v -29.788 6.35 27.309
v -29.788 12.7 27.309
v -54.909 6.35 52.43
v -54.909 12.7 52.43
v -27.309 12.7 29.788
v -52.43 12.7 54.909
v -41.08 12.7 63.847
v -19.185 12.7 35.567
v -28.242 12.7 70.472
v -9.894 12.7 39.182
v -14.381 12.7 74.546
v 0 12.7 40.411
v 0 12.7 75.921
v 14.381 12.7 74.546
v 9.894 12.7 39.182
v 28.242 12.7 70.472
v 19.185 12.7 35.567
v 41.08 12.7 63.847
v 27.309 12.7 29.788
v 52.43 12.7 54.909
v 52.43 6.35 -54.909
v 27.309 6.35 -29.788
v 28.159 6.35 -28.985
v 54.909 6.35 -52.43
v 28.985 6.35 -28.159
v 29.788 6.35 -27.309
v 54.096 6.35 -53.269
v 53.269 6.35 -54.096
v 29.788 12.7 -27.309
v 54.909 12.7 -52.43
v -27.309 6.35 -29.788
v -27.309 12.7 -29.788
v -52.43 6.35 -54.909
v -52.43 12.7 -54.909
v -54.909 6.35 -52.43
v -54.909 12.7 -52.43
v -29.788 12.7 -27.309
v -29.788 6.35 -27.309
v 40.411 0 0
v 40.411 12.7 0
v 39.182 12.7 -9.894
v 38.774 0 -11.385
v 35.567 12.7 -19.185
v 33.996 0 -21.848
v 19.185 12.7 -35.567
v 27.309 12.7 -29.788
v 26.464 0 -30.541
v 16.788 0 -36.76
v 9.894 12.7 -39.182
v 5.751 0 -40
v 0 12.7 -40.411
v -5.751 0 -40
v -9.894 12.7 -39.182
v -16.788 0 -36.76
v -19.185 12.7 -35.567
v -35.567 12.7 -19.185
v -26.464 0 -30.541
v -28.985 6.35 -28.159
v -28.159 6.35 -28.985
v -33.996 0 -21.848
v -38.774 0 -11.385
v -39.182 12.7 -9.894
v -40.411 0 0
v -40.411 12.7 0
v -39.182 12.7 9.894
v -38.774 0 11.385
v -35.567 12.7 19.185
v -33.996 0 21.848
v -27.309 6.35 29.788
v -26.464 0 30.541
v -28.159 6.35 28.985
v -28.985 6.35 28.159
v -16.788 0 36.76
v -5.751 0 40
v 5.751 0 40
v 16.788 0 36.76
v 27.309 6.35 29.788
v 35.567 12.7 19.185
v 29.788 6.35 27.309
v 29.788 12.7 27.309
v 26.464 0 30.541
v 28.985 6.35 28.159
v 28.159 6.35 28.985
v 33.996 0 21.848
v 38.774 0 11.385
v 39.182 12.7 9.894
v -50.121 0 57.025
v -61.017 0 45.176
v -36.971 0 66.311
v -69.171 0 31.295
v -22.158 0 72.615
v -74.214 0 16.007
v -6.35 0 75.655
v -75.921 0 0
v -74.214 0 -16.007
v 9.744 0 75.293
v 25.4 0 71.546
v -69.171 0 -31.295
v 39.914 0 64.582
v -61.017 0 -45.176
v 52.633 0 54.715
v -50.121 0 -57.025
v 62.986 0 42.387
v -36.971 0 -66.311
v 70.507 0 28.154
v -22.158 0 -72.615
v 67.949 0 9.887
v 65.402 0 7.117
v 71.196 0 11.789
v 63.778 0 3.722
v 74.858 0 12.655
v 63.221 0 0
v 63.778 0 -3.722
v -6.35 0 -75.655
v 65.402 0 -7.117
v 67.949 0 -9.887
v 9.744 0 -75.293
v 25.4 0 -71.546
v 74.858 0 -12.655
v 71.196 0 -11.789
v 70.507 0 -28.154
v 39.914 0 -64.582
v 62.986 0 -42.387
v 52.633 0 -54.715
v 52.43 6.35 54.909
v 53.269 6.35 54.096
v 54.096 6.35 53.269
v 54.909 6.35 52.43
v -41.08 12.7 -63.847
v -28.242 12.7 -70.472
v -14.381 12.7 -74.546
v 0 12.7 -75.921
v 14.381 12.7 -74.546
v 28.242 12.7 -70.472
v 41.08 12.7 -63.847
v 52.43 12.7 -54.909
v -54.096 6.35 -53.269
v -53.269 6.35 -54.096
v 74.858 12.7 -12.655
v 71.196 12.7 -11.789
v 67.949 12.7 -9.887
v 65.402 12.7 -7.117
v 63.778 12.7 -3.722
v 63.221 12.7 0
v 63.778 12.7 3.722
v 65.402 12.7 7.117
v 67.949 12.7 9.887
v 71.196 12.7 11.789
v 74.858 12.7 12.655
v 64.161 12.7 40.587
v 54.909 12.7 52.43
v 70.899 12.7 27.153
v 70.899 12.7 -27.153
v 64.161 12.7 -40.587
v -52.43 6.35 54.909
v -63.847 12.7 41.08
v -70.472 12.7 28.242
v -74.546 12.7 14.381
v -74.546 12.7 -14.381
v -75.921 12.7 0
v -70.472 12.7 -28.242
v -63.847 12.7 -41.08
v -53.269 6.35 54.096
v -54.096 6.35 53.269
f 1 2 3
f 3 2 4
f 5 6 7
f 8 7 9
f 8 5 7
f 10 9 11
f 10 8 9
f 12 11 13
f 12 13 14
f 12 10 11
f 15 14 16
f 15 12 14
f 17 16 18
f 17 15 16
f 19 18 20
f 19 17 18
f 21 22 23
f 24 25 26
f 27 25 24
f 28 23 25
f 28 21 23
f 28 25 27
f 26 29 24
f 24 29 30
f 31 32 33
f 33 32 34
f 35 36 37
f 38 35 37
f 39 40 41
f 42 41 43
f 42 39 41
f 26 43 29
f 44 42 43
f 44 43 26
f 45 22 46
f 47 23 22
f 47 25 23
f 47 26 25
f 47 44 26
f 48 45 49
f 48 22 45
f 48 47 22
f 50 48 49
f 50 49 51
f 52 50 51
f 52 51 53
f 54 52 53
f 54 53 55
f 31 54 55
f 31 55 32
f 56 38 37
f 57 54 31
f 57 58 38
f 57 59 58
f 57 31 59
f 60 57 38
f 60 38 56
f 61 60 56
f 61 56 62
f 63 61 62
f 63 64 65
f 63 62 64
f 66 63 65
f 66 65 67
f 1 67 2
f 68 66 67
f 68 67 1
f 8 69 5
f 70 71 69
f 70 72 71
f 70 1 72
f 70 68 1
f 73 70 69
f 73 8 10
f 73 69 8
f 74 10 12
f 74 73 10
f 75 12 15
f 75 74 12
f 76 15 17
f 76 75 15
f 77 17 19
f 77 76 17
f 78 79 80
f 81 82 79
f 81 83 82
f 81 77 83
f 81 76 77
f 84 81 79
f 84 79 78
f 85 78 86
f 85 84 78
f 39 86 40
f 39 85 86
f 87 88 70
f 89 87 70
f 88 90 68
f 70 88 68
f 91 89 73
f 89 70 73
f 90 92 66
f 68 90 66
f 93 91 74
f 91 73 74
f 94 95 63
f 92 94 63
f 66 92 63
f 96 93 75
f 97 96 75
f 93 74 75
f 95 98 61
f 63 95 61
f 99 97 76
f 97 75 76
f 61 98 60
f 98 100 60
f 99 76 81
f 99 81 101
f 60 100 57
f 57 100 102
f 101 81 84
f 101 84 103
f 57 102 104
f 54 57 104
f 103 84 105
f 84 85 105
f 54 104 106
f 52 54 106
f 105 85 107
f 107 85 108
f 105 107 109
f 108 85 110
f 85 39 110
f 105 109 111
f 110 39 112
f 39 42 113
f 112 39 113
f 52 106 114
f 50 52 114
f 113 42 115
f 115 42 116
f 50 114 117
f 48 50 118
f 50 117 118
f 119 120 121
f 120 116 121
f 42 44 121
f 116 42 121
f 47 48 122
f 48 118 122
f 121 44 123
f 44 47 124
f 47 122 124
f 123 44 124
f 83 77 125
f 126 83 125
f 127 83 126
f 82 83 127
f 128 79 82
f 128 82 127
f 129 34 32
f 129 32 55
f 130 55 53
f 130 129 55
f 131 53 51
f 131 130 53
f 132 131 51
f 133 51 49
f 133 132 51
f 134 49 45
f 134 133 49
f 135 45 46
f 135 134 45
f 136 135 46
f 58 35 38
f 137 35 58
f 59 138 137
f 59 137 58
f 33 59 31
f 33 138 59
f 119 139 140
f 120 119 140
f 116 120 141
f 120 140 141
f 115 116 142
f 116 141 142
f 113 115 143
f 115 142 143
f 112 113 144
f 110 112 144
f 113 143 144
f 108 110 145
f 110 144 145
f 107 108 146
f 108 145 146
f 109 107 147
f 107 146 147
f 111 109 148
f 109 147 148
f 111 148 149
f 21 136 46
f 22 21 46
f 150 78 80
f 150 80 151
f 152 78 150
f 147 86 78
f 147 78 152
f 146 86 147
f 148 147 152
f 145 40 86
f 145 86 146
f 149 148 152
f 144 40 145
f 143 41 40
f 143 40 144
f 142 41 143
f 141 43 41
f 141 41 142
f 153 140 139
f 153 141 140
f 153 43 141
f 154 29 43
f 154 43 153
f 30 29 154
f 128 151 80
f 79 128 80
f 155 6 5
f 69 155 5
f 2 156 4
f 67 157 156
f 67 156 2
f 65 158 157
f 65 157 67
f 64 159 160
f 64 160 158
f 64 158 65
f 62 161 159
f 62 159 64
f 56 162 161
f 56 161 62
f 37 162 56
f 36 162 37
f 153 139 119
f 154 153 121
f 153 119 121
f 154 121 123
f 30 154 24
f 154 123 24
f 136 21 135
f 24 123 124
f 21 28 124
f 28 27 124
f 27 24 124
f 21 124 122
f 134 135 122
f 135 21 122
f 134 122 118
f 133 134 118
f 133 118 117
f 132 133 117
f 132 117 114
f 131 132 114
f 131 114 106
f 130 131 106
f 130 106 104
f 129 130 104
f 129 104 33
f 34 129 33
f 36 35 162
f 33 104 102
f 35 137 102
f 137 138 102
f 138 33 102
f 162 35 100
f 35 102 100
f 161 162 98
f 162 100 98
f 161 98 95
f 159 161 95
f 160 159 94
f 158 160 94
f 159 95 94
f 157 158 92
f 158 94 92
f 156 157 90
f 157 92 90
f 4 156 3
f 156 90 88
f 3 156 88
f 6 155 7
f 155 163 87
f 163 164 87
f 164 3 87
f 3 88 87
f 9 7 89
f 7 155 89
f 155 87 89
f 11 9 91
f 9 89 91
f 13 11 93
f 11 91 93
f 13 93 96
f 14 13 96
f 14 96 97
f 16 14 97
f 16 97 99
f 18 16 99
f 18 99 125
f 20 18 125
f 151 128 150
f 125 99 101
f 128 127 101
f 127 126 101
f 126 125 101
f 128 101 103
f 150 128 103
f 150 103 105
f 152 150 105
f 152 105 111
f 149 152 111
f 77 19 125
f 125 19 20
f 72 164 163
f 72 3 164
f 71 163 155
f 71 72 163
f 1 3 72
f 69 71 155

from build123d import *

# Parameters (mm, degrees)
SKETCH1_R           = 75.9206
BOSS_EXTRUDE1_DEPTH = 12.7
SKETCH1_10_R        = 40.4114
CUT_EXTRUDE2_DEPTH  = 13.7
SKETCH2_R           = 12.7
CUT_EXTRUDE3_DEPTH  = 13.7
CUT_EXTRUDE5_DEPTH  = 6.35


with BuildPart() as part:
    # Sketch1 → Boss-Extrude1 (new body)
    with BuildSketch(Plane(origin=(0, 0, 0), x_dir=(1, 0, 0), z_dir=(0, 1, 0))):
        Circle(SKETCH1_R)
    extrude(amount=BOSS_EXTRUDE1_DEPTH)

    # Sketch1<10> → Cut-Extrude2 (cut, through all)
    with BuildSketch(Plane(origin=(0, 0, 0), x_dir=(1, 0, 0), z_dir=(0, 1, 0))):
        Circle(SKETCH1_10_R)
    extrude(amount=CUT_EXTRUDE2_DEPTH, mode=Mode.SUBTRACT)

    # Sketch2 → Cut-Extrude3 (cut, through all)
    with BuildSketch(Plane(origin=(0, 12.7, 0), x_dir=(1, 0, 0), z_dir=(0, 1, 0))):
        with Locations((75.9206, 0)):
            Circle(SKETCH2_R)
    extrude(amount=-CUT_EXTRUDE3_DEPTH, mode=Mode.SUBTRACT)

    # Sketch3 → Cut-Extrude5 (cut)
    with BuildSketch(Plane(origin=(0, 12.7, 0), x_dir=(1, 0, 0), z_dir=(0, 1, 0))):
        Polygon((-28.180043708, 25.701493018), (-25.701493019, 28.180043708), (-60.52670499, 63.00525568), (-63.00525568, 60.52670499), align=None)
        Polygon((28.180043708, 25.701493019), (63.00525568, 60.52670499), (60.52670499, 63.00525568), (25.701493019, 28.180043708), align=None)
        Polygon((25.701493019, -28.180043708), (60.52670499, -63.00525568), (63.00525568, -60.52670499), (28.180043708, -25.701493018), align=None)
        Polygon((-28.180043708, -25.701493019), (-63.00525568, -60.52670499), (-60.52670499, -63.00525568), (-25.701493018, -28.180043708), align=None)
    extrude(amount=-CUT_EXTRUDE5_DEPTH, mode=Mode.SUBTRACT)


solid = part.part
